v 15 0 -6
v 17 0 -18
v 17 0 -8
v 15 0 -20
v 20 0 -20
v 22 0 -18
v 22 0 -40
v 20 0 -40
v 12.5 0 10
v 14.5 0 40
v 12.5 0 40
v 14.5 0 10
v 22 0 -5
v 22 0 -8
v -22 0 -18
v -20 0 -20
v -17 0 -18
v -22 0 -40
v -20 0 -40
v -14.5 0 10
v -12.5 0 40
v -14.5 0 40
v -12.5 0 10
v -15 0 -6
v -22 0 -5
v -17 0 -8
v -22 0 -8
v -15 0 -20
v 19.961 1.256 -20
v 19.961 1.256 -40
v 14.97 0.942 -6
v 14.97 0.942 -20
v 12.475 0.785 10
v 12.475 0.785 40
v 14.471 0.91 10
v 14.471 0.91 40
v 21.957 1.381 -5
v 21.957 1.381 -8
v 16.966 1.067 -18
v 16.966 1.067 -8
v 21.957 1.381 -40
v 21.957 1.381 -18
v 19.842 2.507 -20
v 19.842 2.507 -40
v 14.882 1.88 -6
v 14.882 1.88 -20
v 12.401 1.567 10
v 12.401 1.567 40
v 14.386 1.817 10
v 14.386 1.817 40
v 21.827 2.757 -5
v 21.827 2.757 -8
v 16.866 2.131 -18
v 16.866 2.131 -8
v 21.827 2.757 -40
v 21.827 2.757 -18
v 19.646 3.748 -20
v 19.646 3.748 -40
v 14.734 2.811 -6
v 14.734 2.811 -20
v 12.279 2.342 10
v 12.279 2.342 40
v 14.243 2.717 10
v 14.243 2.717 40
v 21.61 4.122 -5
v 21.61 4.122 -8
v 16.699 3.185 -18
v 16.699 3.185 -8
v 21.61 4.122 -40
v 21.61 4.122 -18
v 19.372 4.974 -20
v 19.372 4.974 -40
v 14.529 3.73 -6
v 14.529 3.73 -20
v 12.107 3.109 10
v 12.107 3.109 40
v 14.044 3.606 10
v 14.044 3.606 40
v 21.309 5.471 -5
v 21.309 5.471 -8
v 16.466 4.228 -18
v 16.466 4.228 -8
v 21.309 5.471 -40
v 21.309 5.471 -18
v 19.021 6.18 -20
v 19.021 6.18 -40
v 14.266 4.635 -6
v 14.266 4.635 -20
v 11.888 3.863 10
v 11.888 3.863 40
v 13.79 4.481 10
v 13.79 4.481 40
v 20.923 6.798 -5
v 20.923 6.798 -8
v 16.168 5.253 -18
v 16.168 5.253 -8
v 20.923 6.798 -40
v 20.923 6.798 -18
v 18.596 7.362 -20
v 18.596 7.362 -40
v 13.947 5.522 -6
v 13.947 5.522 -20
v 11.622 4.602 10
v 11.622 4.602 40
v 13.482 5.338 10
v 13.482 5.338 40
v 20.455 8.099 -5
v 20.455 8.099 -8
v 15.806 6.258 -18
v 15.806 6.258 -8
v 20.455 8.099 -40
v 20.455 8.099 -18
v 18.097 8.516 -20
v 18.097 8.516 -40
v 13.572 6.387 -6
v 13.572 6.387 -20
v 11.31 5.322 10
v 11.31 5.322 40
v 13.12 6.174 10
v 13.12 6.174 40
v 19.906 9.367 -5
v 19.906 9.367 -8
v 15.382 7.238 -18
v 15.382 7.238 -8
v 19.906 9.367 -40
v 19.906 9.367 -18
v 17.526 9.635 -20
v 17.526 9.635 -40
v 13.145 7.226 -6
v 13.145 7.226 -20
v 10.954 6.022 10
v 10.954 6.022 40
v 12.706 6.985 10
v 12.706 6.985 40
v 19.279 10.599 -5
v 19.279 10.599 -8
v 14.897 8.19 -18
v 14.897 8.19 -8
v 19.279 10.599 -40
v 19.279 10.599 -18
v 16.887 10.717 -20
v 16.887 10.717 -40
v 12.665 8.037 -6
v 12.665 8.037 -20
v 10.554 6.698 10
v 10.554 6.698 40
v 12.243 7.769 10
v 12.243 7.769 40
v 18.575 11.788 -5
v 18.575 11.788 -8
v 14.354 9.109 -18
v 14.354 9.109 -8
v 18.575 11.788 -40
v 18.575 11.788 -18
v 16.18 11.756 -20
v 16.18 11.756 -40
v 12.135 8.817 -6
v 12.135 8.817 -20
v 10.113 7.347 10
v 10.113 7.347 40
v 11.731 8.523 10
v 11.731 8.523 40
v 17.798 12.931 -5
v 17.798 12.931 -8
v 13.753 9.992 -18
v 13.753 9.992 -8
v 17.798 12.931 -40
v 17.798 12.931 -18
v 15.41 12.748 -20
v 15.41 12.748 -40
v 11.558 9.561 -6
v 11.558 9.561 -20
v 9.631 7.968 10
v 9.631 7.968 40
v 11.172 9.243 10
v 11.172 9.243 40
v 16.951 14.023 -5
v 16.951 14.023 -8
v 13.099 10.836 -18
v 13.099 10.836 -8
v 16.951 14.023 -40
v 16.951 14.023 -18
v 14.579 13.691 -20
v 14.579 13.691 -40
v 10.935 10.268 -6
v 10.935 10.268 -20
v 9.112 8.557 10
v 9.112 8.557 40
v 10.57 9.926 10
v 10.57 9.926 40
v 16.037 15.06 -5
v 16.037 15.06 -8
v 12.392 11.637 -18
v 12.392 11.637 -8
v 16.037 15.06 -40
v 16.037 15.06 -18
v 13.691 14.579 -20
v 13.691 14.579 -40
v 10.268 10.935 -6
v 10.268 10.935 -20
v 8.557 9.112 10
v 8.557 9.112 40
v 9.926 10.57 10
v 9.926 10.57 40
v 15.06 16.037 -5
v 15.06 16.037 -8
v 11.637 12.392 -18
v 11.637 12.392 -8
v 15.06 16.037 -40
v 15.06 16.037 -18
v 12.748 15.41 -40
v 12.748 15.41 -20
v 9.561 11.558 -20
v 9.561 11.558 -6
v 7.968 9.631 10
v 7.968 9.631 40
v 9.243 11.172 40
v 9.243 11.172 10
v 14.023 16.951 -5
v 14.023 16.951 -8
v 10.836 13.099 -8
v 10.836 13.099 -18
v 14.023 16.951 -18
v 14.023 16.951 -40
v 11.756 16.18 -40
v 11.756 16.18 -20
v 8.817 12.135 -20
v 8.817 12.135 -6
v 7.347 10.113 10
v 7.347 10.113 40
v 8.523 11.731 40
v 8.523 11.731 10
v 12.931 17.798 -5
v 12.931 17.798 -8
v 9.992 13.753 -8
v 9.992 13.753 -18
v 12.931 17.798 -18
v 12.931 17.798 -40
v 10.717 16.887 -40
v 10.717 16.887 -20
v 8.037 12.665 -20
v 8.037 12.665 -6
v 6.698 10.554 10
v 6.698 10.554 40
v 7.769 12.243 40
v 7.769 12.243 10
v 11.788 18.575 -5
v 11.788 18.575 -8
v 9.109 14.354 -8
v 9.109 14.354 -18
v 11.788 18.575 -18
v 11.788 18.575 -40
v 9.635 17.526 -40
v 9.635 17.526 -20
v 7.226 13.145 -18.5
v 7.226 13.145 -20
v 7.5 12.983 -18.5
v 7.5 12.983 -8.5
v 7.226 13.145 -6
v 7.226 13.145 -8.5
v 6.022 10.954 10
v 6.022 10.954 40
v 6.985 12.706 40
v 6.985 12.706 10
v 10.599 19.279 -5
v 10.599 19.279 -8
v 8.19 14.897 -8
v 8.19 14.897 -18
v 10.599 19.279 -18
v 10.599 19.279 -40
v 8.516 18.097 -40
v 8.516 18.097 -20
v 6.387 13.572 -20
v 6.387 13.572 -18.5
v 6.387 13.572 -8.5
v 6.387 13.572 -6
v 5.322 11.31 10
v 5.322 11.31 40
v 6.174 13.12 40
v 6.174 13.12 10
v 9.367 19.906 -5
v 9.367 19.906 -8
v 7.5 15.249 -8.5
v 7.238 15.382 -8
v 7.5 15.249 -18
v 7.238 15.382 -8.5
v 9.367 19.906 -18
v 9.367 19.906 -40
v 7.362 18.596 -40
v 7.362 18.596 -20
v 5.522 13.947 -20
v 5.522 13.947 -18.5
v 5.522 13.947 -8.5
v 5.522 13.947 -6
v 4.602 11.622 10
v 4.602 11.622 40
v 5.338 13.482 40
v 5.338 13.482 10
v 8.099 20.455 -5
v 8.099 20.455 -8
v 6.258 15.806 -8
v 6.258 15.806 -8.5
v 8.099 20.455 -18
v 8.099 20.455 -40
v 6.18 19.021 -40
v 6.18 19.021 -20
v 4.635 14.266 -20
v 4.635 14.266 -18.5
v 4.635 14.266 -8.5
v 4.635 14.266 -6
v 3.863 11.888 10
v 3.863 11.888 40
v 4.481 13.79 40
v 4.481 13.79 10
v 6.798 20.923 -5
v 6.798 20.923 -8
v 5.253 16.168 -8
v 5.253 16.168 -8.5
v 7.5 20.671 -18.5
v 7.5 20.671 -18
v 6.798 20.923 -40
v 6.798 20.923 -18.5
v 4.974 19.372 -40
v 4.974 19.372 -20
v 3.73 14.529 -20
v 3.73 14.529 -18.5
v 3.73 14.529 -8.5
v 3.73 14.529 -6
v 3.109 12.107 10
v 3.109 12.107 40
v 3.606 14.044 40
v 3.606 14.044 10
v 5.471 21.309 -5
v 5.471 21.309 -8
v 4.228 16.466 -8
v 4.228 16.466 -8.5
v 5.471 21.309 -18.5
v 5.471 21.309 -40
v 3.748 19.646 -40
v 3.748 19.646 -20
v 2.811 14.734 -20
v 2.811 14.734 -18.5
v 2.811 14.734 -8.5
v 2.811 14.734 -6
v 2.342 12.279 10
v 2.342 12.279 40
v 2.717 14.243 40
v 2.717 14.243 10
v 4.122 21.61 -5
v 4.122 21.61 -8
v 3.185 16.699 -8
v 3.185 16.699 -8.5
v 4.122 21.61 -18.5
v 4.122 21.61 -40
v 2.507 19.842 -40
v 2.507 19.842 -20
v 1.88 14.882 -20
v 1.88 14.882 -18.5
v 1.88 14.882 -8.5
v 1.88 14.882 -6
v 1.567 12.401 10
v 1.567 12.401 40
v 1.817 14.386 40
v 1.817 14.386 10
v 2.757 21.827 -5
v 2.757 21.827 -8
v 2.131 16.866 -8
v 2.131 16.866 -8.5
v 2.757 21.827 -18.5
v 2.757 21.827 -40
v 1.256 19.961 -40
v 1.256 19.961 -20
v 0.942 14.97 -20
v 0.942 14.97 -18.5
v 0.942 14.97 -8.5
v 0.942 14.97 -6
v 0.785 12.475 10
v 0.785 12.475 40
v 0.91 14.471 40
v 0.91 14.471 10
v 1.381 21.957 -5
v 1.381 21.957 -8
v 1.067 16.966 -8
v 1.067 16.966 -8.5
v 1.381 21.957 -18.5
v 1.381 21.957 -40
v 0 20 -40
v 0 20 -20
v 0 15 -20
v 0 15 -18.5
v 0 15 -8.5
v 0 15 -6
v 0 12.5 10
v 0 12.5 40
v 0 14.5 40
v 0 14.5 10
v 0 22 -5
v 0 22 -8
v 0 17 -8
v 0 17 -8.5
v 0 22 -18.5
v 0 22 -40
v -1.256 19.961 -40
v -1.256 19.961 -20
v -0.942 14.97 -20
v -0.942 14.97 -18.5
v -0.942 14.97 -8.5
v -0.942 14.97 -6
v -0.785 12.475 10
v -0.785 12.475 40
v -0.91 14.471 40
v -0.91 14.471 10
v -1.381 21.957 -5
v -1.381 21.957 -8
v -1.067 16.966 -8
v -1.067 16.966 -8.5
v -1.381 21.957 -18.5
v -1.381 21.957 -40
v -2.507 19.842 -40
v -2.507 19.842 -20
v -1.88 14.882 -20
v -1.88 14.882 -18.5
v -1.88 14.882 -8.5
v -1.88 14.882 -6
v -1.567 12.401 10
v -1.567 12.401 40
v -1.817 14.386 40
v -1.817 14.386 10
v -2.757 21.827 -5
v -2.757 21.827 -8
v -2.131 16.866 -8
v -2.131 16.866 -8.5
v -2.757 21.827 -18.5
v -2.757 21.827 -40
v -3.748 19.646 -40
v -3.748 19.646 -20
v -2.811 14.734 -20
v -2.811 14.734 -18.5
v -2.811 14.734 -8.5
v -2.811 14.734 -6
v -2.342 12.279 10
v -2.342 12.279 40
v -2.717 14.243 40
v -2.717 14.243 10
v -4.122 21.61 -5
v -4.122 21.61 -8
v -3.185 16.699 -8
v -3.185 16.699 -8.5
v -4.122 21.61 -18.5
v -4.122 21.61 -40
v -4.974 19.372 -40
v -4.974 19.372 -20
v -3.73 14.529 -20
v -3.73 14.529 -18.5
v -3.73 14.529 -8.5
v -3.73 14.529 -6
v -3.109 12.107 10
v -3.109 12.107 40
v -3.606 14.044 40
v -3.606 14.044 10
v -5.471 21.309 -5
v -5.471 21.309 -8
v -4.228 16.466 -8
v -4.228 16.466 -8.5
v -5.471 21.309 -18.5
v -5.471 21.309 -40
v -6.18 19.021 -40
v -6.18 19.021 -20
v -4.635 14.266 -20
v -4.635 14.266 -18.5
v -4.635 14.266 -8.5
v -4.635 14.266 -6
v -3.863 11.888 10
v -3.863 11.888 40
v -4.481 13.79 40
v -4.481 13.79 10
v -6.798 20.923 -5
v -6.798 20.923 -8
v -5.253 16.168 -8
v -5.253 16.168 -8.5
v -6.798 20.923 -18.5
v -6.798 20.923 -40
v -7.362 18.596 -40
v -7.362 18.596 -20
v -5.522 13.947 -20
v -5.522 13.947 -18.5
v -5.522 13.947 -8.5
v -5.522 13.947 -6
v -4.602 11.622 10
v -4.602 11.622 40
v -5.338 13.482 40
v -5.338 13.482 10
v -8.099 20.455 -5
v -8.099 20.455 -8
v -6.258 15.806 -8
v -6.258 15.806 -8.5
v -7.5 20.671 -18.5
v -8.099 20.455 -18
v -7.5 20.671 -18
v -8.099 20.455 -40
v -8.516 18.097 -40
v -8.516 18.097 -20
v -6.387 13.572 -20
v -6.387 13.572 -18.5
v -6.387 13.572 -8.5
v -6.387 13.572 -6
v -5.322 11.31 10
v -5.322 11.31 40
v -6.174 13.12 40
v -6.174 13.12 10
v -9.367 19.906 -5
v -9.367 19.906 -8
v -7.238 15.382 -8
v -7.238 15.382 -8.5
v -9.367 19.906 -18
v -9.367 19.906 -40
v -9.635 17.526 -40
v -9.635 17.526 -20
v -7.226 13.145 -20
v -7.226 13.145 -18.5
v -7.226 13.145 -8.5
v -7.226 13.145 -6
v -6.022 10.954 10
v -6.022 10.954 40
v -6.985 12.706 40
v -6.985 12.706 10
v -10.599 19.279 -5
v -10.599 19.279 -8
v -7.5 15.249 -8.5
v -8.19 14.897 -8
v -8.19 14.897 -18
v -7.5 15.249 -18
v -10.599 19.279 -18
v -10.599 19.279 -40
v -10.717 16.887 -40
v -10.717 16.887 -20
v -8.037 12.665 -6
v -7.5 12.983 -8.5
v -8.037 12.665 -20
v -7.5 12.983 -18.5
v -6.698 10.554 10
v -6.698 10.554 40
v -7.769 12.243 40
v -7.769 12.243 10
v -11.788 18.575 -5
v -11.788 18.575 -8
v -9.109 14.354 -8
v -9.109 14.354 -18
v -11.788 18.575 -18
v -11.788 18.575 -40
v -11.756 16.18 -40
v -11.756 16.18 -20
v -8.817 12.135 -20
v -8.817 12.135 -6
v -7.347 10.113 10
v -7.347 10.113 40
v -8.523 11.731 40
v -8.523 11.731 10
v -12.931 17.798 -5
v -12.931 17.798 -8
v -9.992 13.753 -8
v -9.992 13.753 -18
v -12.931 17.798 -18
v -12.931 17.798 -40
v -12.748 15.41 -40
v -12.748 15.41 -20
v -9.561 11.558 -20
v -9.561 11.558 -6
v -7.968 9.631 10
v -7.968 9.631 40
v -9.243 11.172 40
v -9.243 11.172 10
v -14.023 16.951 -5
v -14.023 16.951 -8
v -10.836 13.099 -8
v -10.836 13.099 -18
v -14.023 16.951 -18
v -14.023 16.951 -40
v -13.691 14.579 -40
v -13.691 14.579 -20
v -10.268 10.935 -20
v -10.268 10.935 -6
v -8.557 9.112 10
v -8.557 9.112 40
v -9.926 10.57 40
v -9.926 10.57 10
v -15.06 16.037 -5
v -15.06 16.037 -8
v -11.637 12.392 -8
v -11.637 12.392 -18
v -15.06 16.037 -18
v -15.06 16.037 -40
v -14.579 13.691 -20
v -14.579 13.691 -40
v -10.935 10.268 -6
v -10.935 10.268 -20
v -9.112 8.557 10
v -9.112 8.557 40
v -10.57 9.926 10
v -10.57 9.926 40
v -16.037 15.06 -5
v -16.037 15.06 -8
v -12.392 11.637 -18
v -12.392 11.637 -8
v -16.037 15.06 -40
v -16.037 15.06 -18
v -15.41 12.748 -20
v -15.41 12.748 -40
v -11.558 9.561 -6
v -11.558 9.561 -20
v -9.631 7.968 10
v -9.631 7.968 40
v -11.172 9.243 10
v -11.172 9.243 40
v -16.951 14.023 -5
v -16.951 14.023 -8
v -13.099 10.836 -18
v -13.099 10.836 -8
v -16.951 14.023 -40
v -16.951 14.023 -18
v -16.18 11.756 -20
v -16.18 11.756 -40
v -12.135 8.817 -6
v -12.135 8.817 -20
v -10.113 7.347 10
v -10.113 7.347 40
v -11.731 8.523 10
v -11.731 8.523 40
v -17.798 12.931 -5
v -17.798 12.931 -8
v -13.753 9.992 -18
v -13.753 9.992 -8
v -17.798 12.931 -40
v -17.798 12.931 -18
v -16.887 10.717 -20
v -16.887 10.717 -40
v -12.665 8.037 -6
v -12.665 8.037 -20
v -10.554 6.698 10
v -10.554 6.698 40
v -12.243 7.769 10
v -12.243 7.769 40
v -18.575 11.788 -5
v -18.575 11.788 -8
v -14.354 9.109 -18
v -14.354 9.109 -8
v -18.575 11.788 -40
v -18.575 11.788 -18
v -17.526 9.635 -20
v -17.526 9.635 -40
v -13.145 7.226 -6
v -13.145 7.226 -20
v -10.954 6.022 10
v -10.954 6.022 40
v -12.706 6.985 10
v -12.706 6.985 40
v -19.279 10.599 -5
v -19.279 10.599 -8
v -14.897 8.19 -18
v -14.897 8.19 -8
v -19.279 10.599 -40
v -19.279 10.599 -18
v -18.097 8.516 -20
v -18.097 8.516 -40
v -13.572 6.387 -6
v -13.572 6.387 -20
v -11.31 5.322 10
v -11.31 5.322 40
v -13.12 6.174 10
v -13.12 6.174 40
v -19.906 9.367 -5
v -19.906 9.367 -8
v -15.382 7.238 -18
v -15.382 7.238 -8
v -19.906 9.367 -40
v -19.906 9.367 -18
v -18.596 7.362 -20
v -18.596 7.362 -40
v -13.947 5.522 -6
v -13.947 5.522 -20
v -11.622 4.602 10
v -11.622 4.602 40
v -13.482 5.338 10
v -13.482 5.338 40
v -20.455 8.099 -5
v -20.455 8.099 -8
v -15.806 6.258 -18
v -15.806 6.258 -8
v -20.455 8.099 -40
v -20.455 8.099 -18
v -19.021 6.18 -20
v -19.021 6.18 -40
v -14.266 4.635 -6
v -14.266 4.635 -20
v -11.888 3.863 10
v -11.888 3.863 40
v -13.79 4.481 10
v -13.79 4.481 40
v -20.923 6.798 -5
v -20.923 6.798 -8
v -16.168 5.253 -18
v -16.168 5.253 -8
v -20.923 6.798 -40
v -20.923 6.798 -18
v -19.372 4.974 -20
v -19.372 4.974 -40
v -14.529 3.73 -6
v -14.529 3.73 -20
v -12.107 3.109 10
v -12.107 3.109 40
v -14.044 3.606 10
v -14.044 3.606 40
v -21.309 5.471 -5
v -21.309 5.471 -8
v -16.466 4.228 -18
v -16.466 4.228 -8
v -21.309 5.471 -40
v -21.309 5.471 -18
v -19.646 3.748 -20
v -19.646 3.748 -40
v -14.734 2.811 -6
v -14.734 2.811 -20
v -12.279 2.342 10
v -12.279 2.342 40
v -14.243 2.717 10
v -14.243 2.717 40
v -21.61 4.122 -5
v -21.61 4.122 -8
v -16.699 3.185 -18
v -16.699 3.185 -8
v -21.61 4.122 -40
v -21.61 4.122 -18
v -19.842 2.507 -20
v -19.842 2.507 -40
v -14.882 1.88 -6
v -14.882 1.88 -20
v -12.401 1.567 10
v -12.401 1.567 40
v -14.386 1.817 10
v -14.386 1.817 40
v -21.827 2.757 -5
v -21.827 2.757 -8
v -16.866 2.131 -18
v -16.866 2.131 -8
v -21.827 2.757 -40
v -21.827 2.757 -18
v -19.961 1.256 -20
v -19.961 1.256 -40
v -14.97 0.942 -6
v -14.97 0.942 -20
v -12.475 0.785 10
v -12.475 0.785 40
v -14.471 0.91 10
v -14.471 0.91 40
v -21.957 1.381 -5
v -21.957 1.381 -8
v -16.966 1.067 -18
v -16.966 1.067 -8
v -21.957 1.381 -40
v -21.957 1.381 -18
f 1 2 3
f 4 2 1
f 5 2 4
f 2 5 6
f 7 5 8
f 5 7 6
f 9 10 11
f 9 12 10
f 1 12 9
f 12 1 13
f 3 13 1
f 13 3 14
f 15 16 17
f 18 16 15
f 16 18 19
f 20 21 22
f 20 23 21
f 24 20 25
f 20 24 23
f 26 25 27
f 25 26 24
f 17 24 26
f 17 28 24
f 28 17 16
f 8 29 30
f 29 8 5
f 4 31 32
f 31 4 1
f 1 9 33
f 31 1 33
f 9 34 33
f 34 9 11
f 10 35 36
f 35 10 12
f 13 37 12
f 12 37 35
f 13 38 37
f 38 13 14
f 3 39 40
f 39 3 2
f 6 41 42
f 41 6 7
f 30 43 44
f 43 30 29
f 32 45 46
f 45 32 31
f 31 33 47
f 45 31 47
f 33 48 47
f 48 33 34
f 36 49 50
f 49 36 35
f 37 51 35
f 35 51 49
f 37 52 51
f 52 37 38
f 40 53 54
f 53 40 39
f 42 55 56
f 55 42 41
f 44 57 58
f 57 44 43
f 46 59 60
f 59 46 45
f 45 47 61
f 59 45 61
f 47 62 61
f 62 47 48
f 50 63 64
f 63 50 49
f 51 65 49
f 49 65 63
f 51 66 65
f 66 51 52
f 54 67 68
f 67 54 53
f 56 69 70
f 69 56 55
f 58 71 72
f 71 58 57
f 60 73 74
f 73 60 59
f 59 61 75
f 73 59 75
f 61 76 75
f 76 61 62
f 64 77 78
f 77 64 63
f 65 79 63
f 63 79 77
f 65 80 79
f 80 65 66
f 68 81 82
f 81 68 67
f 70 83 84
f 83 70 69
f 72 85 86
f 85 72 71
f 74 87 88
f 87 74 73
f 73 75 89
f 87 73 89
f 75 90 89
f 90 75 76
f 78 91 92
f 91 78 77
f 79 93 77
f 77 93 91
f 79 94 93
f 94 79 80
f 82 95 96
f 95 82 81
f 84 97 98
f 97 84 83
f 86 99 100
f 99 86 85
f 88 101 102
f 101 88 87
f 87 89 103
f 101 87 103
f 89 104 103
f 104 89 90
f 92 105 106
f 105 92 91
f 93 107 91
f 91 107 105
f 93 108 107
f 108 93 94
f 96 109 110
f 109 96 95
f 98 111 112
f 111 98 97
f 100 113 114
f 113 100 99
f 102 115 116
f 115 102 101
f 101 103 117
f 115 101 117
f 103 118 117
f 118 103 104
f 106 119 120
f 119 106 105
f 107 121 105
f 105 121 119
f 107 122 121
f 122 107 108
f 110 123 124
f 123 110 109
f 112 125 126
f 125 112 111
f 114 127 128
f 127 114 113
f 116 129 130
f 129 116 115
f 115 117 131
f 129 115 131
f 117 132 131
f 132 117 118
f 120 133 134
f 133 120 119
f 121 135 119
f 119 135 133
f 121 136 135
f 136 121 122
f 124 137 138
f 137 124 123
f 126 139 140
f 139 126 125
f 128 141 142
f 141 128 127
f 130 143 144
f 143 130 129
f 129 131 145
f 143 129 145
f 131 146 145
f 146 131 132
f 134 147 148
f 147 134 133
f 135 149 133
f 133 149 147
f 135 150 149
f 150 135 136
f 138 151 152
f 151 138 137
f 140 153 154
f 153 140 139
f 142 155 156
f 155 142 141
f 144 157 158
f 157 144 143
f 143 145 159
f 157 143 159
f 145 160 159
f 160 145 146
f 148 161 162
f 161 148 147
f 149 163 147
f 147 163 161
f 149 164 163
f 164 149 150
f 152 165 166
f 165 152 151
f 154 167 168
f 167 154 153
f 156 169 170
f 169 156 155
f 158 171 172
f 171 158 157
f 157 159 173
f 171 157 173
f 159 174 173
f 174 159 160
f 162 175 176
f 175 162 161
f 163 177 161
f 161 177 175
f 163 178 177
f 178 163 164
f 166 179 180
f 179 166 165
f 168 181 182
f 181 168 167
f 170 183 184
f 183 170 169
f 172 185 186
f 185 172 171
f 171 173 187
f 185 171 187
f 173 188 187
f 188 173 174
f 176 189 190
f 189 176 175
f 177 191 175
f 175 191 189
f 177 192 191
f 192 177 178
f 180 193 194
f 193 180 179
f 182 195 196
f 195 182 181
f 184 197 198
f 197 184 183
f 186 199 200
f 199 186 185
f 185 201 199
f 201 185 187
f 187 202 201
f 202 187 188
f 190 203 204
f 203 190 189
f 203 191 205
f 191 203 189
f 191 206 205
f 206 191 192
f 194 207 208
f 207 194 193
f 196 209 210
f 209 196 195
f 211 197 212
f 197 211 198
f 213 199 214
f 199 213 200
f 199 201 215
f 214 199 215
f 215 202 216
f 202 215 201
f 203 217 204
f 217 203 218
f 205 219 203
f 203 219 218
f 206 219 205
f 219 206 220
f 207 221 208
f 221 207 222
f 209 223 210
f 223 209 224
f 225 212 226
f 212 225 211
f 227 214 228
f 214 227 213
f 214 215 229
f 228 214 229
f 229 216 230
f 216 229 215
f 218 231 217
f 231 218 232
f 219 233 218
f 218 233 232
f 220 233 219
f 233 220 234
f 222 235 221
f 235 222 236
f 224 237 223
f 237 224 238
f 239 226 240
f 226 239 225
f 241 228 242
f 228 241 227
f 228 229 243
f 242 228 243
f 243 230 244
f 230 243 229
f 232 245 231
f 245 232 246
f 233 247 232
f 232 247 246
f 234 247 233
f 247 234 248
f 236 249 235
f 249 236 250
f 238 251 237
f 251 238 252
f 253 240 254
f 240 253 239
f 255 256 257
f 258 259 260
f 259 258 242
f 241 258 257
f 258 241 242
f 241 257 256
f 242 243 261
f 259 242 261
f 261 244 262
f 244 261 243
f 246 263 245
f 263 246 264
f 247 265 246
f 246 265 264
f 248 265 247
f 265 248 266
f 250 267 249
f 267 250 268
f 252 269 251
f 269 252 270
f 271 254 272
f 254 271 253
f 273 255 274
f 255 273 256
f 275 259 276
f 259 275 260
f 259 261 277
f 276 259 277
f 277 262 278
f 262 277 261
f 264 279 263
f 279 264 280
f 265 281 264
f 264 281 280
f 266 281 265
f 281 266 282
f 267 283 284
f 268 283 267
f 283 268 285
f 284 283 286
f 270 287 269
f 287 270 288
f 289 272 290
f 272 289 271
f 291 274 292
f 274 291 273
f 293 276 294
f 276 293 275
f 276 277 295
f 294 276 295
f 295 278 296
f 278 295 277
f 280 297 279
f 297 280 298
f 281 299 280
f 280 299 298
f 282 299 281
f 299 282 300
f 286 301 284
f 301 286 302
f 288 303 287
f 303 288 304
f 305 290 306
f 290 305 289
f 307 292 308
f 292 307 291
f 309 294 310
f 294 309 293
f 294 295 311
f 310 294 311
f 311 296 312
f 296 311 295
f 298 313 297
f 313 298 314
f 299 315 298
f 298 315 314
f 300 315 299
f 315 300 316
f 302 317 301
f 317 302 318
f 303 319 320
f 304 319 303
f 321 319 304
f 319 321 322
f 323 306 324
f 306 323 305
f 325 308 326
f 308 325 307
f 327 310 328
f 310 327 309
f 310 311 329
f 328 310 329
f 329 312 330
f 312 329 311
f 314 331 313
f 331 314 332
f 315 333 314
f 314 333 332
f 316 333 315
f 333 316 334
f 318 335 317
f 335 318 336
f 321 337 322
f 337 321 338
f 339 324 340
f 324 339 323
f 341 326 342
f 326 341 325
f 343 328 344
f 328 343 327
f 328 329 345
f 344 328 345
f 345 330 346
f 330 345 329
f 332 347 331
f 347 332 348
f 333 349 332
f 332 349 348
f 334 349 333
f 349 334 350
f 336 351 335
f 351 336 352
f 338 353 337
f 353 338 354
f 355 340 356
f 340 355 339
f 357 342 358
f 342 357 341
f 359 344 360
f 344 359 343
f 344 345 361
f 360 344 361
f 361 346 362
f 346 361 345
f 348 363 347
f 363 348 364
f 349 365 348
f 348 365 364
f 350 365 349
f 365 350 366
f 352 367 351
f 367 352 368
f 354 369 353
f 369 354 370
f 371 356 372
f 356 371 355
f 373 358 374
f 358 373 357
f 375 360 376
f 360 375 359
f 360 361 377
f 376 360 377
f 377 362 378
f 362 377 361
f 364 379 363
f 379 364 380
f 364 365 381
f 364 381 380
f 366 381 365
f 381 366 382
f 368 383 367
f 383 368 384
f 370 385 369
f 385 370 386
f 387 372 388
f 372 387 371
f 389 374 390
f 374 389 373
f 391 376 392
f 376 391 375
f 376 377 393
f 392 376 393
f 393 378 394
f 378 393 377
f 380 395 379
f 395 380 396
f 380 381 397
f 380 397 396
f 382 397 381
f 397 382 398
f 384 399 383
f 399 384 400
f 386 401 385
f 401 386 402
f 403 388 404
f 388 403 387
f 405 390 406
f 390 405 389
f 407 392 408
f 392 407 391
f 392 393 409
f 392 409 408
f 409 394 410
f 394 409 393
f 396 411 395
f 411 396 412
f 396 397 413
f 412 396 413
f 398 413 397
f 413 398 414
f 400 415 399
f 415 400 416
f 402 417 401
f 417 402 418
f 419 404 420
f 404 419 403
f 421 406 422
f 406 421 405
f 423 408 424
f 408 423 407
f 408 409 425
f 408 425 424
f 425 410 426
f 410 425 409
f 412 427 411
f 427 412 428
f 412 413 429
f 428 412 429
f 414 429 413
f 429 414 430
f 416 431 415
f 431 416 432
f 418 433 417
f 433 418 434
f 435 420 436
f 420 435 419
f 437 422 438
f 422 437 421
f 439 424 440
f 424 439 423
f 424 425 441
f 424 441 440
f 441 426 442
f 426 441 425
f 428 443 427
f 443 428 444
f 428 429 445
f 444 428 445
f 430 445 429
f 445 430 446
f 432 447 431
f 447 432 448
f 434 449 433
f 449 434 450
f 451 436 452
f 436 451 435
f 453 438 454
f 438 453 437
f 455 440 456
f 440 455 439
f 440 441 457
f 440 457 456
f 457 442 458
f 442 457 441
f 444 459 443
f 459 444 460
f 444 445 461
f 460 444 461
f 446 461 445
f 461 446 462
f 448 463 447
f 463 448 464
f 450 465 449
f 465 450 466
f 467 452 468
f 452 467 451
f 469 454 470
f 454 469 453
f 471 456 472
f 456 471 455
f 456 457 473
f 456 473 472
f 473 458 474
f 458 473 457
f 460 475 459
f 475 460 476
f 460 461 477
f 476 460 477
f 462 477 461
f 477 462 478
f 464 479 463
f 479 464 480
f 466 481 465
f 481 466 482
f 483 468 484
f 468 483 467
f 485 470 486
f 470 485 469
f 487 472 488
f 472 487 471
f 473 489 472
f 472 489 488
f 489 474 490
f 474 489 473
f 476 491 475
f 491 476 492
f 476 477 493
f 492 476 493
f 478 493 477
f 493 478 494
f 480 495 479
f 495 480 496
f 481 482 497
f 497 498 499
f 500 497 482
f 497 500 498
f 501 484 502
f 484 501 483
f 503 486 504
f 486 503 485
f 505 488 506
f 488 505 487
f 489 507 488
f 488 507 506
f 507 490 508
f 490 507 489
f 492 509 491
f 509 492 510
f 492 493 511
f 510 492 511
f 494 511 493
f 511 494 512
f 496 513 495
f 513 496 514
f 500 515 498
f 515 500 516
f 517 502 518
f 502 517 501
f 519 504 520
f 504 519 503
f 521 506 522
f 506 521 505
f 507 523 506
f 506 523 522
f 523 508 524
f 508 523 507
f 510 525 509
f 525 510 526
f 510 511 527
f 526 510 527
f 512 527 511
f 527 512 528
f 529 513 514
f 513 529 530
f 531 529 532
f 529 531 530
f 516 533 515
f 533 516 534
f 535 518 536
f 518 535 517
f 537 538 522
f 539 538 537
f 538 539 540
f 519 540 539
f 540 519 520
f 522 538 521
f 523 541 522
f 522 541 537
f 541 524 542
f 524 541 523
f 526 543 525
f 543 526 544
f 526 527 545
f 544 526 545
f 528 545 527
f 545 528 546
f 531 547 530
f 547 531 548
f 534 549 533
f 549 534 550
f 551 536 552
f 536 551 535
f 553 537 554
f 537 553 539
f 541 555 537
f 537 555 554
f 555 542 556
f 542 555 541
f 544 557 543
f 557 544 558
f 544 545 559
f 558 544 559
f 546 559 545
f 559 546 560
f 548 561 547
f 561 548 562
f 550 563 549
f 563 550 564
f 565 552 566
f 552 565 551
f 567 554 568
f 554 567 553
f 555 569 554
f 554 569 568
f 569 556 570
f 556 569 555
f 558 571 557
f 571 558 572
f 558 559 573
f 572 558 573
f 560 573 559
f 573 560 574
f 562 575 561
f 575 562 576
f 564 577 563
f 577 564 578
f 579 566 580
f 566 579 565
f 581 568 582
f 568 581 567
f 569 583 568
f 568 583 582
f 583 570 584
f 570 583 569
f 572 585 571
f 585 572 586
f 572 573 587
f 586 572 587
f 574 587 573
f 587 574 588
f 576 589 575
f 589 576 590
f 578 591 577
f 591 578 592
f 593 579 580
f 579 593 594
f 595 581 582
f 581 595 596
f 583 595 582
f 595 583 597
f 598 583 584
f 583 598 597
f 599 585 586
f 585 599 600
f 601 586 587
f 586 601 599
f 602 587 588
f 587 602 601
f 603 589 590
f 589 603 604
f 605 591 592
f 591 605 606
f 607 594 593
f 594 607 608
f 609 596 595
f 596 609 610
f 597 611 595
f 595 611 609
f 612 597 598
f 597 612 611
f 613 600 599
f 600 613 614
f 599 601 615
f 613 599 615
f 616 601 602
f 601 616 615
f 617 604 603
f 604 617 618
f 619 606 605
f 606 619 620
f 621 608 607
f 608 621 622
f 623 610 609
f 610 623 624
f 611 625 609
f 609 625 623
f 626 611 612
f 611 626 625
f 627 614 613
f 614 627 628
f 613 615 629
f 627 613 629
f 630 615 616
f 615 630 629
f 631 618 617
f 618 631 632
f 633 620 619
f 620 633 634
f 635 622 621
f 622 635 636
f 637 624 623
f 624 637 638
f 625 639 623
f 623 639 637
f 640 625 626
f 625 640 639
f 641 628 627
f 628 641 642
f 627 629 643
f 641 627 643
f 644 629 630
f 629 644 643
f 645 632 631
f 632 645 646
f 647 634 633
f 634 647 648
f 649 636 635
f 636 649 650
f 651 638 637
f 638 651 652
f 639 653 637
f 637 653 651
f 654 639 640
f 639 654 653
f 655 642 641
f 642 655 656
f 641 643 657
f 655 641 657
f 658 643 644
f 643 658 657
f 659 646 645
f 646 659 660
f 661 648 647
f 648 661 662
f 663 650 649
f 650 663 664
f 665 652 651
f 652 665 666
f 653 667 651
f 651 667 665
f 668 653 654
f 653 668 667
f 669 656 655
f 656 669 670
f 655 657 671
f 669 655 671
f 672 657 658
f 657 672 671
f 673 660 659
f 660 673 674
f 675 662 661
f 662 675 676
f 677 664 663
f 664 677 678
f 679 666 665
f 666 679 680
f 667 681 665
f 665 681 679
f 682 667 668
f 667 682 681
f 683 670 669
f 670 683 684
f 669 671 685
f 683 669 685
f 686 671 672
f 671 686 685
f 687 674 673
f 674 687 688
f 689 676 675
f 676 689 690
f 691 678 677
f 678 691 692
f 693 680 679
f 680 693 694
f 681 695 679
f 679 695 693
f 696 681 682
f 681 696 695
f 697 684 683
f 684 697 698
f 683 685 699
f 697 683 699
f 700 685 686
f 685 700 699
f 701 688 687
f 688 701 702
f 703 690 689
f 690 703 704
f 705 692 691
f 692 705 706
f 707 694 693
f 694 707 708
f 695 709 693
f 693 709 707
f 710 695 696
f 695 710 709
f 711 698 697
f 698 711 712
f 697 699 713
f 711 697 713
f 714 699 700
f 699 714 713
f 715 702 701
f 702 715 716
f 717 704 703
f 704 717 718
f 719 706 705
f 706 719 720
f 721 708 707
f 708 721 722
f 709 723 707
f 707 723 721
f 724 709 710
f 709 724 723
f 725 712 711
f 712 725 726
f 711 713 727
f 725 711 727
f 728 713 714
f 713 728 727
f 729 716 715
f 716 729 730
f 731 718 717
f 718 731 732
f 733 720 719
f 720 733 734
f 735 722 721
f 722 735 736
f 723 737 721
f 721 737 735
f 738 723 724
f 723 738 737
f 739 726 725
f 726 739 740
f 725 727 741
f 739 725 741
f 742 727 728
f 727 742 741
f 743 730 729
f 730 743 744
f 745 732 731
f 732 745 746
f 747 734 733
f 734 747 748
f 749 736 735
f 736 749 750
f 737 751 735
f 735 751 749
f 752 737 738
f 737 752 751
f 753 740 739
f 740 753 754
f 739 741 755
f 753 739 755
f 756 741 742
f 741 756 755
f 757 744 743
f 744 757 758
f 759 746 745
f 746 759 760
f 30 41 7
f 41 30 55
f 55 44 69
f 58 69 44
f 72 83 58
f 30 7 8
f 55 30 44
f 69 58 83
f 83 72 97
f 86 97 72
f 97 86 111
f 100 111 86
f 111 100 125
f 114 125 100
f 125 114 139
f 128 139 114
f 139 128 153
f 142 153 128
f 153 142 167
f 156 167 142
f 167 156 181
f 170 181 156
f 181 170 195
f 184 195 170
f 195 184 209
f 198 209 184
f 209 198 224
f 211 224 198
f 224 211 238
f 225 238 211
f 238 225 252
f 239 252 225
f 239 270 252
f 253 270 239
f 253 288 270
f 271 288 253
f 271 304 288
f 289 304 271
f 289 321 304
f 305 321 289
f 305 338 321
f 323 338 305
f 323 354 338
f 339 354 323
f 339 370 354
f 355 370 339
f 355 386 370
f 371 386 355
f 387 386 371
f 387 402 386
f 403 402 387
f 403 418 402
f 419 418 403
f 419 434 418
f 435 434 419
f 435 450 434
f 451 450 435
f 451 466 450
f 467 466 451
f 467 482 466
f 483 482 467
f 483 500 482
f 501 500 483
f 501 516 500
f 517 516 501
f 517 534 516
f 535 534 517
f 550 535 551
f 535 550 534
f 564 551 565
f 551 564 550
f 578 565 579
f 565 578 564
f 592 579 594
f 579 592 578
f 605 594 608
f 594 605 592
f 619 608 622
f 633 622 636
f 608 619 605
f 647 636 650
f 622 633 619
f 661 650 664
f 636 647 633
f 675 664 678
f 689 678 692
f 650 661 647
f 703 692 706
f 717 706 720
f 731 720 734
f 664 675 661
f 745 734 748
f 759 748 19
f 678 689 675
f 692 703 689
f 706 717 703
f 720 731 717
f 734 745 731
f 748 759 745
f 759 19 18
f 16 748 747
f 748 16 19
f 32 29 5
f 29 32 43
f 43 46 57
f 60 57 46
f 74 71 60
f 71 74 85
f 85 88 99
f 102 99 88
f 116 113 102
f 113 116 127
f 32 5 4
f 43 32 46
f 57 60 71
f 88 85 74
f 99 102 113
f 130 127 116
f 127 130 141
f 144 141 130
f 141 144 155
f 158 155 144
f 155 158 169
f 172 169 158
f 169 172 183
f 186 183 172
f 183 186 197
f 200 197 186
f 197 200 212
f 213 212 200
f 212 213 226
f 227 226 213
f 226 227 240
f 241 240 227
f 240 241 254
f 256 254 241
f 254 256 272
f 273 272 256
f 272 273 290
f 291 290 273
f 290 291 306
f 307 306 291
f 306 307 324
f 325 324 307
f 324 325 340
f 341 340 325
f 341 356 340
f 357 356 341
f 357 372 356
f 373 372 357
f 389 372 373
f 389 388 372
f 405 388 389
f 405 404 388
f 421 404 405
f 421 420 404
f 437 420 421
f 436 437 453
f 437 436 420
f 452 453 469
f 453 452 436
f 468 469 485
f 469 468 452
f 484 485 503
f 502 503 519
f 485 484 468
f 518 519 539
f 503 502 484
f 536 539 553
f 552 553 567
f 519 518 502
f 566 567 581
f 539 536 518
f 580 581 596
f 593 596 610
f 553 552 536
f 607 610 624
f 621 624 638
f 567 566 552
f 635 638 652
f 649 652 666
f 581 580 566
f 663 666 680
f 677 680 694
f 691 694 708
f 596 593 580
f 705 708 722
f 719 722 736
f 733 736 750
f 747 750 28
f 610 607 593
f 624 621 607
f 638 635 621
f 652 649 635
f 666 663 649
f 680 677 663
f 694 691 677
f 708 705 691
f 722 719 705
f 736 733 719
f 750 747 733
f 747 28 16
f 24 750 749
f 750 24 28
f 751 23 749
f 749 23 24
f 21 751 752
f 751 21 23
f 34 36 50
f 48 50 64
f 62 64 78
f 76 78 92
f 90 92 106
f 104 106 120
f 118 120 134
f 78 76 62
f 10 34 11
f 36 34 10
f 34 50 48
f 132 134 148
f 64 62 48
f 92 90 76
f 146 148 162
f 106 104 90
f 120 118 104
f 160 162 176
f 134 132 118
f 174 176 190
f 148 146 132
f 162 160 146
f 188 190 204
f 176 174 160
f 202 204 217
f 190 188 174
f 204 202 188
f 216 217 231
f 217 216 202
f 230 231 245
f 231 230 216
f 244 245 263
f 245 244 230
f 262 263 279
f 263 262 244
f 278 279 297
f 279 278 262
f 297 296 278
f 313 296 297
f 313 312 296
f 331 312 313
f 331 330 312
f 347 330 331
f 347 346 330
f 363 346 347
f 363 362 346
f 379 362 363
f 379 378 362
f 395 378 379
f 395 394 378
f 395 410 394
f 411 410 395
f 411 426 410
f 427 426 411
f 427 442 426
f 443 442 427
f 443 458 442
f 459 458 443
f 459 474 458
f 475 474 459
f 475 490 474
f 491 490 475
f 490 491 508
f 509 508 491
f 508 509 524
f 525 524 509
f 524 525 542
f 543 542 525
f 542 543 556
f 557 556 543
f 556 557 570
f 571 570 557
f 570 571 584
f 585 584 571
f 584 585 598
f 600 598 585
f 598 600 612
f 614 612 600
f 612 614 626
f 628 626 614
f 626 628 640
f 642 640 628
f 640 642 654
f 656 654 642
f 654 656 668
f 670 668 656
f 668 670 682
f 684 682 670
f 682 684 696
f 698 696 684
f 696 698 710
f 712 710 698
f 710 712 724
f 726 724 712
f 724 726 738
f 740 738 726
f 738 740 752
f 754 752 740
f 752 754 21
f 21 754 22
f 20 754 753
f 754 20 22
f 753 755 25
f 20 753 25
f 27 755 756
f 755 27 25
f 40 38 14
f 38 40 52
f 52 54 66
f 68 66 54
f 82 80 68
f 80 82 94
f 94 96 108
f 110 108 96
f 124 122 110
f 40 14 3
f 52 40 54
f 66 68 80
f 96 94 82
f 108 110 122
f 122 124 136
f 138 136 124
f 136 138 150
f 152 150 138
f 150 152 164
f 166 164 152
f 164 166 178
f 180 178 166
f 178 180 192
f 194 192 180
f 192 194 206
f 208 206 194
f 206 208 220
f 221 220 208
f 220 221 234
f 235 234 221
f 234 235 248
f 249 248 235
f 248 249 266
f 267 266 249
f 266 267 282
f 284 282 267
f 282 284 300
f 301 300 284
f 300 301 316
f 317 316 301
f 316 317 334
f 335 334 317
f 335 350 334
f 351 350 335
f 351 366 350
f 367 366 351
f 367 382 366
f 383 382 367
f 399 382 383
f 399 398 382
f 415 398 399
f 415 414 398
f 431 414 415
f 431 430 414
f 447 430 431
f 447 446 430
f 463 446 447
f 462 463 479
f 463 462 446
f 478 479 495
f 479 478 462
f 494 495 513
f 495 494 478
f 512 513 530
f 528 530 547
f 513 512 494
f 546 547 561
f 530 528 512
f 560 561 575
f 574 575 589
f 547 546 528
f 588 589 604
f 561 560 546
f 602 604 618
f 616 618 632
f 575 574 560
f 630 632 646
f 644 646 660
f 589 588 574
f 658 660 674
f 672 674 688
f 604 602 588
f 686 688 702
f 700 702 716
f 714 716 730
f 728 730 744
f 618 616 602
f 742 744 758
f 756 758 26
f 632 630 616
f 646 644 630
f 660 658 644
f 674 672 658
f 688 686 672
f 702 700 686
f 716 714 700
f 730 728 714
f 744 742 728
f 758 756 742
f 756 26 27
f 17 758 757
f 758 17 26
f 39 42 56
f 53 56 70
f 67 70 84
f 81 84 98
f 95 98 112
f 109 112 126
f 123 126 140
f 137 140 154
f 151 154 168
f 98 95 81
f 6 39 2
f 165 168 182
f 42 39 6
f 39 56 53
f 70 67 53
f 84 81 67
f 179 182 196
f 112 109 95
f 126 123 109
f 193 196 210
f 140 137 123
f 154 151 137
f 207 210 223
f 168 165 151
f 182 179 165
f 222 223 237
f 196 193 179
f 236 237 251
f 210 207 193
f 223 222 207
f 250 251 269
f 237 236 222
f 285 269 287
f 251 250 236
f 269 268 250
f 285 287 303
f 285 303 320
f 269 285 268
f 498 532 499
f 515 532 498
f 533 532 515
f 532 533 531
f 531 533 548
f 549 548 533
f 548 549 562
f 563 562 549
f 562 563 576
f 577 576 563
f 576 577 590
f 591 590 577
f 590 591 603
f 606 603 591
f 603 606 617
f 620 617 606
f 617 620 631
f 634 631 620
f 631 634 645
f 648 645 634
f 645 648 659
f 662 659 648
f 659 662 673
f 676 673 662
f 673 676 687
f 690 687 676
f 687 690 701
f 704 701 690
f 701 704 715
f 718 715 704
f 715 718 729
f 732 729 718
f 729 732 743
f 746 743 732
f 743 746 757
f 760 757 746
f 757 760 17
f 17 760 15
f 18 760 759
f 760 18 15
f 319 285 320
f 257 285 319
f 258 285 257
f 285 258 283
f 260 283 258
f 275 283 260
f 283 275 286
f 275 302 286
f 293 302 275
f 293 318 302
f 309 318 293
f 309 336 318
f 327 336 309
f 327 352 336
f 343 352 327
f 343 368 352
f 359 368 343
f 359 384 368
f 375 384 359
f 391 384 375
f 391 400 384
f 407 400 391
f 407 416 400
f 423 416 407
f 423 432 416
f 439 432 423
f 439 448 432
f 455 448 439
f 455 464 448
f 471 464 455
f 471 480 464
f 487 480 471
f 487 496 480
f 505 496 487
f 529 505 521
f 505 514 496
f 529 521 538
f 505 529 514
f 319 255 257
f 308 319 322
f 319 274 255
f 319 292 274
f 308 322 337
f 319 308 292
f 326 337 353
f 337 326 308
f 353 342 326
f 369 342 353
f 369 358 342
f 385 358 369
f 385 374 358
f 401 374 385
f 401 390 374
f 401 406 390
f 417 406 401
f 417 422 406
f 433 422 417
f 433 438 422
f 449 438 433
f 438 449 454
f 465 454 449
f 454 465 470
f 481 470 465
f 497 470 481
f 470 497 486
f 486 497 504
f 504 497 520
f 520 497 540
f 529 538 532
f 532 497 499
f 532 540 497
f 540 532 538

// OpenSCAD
$bottomDia = 40;
$bottomLen = 20;
$br = $bottomDia/2;
$bl = $bottomLen;

$thickness = 2;

$cutoutDepth = 5;
$cd = $cutoutDepth;
$cutoutHeight = 10 + $thickness;
$ch = $cutoutHeight;

$taperLength  = 15;
$t = $thickness;

$topDia = 25;
$topLen = 30;
$tr = $topDia/2;
$tl = $topLen;

$fn = 100;

$totalLen = $bl+$ch+3+$taperLength+$tl;
pts = [
[$br,0],
[$br, $bl],
[$br-$cd, $bl],
[$br-$cd, $bl+$ch+$t],
//[$br, $bl+$ch+$t],
//[$br, $bl+$ch+3],
[$tr, $bl+$ch+3+$taperLength],
[$tr, $bl+$ch+3+$taperLength+$tl],

[$tr+$t, $bl+$ch+3+$taperLength+$tl],
[$tr+$t, $bl+$ch+3+$taperLength],
[$br+$t, $bl+$ch+3],
[$br+$t, $bl+$ch],
[$br-$cd+$t, $bl+$ch],
[$br-$cd+$t, $bl+$t],
[$br+$t, $bl+$t],
[$br+$t,0],



//[0,12],
//[6,12],
//[6,24],
//[0,24],
//[0,30],
//[8,38],
//[8,46],

//[10,46],
//[10,36],
//[2,28],
//[2,26],
//[8,26],
//[8,10],
//[2,10]

];


difference(){
    translate([0, 0, -$totalLen/2]) // Center the adapter
rotate_extrude(angle = 180, convexity = 10)
polygon(pts);


$startingOfCutout = $bl+$t+5;
translate([0,0,-$startingOfCutout/2])
#cube([15,50,10], center = true);

}
